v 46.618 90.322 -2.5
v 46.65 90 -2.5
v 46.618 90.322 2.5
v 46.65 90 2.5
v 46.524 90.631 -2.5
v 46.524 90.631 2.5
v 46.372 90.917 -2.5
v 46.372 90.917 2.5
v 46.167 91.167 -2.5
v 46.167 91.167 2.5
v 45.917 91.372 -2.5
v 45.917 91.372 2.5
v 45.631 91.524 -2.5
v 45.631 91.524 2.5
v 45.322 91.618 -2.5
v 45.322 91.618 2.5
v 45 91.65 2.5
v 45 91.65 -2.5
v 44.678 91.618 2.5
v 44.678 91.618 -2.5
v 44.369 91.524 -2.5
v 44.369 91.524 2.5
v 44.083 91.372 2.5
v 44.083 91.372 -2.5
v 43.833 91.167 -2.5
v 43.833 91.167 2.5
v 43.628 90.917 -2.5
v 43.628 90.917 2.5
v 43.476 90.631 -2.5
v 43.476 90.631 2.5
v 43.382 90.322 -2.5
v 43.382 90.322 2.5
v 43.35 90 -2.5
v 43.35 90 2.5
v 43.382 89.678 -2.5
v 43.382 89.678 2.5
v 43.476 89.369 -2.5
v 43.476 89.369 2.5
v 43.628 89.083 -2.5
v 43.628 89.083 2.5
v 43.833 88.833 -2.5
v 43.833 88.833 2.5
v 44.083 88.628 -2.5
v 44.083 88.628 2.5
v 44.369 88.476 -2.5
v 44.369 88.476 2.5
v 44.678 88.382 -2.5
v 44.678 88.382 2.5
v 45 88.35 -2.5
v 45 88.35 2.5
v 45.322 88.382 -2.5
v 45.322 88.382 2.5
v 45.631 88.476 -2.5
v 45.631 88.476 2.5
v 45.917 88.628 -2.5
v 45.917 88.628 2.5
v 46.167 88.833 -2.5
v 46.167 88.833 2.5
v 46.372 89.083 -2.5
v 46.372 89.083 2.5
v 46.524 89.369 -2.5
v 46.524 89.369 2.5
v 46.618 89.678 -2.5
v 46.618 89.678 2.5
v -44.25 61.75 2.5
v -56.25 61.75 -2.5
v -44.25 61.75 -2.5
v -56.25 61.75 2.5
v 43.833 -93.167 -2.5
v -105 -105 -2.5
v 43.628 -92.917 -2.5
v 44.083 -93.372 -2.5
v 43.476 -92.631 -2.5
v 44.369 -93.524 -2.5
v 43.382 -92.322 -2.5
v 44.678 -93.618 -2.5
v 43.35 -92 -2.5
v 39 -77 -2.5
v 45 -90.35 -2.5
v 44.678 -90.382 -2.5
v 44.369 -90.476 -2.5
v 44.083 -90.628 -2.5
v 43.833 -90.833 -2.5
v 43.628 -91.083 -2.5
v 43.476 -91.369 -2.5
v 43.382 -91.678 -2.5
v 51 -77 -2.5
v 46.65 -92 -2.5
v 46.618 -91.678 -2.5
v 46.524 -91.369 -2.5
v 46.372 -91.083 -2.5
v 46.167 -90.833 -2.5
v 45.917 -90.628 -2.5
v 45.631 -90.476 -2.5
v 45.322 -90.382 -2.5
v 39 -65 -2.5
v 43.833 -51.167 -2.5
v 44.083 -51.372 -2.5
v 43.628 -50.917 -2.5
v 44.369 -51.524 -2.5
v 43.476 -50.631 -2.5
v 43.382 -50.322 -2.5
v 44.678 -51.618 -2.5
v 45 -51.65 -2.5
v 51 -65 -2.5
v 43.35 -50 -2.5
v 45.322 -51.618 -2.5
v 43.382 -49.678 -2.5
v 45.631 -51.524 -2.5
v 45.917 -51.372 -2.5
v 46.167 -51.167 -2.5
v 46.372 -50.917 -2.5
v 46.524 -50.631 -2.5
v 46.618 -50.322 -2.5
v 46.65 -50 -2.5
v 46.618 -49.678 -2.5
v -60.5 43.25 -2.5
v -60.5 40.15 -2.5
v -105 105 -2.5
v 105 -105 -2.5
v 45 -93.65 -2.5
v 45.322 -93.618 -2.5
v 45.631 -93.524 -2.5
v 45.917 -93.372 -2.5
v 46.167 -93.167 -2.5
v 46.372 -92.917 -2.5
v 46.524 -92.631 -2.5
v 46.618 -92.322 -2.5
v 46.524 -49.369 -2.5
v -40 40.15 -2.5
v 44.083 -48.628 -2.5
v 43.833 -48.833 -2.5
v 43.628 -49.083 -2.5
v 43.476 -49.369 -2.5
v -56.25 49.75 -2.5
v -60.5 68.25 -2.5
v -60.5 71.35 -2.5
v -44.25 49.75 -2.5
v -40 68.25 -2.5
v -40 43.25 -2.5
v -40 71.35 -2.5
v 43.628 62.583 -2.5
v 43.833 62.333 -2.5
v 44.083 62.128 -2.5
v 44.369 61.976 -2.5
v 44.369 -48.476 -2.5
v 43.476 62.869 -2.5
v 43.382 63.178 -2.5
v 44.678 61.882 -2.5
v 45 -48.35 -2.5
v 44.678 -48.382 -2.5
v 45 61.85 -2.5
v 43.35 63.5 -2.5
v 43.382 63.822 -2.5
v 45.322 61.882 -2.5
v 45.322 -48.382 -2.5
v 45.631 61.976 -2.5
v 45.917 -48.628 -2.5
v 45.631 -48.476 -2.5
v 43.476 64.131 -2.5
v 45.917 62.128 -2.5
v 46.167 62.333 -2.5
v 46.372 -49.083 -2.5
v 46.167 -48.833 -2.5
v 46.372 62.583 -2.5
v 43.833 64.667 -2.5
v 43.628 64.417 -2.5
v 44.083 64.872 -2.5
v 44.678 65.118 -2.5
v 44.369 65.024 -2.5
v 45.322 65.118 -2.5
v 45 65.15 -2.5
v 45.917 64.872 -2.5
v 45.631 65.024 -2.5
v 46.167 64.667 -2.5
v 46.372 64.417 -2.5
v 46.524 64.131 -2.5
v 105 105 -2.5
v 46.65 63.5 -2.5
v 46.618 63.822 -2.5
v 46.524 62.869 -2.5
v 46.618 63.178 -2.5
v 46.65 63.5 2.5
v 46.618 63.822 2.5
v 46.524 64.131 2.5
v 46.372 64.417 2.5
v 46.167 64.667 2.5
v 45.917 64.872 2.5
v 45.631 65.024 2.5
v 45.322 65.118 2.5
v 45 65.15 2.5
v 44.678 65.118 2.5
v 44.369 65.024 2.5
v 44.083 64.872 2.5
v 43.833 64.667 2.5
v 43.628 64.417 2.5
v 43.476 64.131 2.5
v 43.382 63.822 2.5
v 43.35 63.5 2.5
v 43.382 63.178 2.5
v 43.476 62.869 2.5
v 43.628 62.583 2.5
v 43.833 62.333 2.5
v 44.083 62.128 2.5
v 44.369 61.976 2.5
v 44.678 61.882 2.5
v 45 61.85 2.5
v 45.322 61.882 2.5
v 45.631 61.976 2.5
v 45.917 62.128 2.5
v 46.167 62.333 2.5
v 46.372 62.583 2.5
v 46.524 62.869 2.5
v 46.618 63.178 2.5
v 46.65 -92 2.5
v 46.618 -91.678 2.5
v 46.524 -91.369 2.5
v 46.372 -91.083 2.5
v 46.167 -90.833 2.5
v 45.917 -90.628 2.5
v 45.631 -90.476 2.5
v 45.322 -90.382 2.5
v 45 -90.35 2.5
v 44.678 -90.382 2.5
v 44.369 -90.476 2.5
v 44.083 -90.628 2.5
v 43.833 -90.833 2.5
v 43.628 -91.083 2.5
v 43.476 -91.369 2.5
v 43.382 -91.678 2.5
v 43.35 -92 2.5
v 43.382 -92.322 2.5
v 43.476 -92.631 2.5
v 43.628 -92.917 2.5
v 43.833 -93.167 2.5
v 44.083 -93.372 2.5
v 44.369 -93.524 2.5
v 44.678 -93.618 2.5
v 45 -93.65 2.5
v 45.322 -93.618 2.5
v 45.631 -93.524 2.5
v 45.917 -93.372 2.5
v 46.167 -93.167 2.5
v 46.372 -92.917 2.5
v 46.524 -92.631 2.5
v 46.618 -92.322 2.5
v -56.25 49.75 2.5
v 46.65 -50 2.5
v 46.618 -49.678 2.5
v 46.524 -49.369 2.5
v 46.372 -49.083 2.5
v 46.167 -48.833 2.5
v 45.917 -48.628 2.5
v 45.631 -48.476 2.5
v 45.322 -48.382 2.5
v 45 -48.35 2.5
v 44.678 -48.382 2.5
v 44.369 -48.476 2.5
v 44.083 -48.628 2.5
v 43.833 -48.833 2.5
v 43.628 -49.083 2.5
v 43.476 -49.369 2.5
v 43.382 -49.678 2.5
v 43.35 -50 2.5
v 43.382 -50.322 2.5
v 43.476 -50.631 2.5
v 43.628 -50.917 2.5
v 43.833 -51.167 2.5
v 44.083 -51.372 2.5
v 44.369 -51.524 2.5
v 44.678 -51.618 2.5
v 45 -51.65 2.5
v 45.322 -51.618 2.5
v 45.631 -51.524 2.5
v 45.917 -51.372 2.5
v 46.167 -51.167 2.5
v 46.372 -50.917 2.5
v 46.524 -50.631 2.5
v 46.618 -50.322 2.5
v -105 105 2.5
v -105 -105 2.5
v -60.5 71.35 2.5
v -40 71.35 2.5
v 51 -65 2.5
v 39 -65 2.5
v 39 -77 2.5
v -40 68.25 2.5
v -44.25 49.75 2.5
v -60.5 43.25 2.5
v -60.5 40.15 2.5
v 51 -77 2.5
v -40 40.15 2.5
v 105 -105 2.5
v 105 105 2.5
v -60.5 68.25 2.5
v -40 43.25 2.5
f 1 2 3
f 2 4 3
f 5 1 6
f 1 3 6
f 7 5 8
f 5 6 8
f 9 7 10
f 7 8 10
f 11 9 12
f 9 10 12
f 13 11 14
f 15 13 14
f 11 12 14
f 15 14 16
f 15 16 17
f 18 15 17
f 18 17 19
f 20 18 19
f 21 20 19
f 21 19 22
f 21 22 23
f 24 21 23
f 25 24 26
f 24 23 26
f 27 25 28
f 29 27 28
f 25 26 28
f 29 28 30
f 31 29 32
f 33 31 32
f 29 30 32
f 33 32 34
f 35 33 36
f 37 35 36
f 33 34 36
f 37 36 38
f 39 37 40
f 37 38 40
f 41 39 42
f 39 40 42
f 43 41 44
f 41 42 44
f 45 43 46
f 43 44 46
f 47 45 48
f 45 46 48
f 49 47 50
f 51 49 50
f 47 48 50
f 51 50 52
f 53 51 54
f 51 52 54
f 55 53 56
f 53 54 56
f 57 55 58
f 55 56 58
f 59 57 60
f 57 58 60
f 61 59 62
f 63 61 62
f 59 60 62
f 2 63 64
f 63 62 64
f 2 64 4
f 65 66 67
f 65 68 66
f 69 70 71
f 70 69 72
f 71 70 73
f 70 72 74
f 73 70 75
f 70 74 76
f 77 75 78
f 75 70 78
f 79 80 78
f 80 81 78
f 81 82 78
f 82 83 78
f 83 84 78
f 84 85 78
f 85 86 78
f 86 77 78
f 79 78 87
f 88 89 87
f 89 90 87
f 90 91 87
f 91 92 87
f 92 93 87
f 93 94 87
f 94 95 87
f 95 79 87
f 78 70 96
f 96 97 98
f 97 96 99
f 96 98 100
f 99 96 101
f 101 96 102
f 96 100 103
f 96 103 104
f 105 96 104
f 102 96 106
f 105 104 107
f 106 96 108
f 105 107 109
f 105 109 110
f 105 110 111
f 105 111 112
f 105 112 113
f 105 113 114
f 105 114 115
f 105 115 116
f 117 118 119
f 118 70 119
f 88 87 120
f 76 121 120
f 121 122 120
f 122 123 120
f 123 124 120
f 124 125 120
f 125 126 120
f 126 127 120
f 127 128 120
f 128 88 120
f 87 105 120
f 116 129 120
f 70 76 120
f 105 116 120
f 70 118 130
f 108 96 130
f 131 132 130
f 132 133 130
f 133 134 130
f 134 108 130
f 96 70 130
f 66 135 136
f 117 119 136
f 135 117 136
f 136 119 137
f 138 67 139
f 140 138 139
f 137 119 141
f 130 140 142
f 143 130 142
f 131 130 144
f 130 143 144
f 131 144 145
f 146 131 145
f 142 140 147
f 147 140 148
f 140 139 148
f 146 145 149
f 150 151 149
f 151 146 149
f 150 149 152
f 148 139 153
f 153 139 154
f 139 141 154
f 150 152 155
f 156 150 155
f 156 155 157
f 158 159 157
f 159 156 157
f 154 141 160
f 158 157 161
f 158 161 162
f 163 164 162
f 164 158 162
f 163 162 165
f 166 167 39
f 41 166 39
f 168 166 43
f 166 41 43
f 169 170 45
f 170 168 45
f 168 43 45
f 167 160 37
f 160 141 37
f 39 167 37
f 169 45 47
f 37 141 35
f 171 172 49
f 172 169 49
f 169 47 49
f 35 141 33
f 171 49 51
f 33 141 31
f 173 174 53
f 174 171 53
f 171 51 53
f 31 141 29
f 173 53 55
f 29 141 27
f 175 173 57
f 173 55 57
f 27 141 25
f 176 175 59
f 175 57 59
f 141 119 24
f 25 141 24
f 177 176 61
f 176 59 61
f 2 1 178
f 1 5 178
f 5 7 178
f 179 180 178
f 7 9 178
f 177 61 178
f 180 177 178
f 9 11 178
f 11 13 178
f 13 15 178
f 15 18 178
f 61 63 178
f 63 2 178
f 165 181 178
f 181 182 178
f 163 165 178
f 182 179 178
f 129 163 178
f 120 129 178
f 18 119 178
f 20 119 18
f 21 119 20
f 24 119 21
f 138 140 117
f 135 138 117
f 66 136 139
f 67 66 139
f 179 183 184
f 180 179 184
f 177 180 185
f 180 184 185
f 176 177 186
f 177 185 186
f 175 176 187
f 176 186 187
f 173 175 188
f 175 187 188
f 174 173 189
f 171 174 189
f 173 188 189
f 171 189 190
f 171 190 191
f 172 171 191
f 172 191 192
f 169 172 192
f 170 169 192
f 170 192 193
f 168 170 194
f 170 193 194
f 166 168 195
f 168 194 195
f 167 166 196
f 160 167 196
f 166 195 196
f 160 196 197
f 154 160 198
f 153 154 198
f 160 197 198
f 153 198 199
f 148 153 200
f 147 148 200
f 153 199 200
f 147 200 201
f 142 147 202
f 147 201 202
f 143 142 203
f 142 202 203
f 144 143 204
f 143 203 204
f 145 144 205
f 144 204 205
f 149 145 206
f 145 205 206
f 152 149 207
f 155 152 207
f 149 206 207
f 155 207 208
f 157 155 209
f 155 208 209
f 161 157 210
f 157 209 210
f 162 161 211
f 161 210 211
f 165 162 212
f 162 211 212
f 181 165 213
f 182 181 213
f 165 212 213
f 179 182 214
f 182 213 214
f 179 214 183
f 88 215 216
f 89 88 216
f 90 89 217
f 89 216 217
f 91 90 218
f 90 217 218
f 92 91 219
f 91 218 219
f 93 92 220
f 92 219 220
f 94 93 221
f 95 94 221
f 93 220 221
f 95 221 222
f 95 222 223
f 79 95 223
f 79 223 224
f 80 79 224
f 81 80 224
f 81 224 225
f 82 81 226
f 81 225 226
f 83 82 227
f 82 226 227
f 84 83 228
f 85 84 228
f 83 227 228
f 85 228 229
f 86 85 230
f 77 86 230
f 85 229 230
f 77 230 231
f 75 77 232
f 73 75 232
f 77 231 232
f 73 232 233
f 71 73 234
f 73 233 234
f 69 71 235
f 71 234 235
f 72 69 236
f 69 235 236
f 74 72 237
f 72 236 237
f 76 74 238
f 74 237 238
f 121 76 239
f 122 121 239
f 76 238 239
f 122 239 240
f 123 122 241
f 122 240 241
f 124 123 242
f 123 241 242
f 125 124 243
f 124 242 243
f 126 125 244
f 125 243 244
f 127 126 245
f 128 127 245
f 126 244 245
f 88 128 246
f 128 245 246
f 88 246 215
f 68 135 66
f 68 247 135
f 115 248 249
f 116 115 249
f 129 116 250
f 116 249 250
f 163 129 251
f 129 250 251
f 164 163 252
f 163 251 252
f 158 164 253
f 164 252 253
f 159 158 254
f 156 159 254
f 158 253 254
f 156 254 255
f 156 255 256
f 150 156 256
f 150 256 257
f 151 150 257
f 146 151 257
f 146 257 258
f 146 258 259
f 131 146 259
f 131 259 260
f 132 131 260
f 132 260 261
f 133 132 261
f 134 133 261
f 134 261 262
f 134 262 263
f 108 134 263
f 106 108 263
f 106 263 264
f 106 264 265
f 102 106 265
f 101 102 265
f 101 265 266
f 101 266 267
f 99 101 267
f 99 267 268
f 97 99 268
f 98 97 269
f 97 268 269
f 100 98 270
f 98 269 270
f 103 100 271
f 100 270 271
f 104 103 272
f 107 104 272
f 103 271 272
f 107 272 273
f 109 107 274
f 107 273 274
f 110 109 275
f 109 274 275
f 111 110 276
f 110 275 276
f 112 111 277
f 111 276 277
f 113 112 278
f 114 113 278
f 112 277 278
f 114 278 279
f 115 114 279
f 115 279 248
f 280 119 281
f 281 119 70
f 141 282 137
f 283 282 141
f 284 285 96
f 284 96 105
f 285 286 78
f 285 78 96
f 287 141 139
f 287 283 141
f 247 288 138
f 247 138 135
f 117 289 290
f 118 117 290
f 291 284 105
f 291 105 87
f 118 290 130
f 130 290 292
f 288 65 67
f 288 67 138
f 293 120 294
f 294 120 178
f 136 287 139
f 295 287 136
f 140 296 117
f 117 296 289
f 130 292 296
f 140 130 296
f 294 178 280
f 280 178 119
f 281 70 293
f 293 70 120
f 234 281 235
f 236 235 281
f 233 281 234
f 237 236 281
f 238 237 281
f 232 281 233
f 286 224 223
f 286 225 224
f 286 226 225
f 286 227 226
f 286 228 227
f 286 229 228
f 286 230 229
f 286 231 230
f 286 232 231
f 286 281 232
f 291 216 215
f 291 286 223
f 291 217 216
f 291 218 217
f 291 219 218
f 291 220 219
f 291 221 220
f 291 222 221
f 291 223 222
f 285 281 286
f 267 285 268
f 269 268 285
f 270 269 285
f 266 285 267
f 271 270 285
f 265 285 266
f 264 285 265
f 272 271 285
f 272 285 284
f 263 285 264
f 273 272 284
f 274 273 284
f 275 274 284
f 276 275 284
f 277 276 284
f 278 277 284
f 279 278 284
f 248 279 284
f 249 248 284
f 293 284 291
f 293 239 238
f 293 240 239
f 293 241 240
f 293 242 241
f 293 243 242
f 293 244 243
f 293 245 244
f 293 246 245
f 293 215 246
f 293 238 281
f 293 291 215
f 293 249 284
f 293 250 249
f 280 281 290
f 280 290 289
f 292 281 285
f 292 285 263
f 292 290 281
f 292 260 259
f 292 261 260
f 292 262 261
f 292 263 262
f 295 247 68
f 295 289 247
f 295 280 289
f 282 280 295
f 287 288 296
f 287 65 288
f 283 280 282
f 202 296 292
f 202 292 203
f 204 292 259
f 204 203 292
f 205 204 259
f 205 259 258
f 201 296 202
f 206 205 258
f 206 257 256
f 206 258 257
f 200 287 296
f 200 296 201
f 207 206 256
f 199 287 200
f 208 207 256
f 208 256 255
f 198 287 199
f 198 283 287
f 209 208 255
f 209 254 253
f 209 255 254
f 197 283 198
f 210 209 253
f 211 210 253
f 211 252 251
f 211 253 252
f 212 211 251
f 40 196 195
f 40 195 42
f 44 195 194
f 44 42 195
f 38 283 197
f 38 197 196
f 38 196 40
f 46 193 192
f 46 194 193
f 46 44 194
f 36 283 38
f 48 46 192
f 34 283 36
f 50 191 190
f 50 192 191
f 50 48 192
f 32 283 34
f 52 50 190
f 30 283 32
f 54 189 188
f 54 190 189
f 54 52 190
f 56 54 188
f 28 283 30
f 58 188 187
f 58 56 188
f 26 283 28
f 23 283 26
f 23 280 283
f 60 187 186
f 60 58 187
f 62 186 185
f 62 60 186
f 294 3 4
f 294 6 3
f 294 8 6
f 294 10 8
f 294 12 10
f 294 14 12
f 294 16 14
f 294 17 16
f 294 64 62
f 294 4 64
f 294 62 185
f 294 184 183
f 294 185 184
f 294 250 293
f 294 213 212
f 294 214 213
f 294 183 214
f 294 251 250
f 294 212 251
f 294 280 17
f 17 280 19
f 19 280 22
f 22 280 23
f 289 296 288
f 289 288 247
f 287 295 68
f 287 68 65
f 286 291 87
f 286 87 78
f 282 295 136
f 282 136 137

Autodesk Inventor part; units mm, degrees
ref_plane "YZ Plane" through (0, 0, 0) normal (1, 0, 0) x (0, 1, 0)
ref_plane "XZ Plane" through (0, 0, 0) normal (0, 1, 0) x (-1, 0, 0)
ref_plane "XY Plane" through (0, 0, 0) normal (0, 0, 1) x (1, 0, 0)
sketch "Sketch1" plane through (0, 0, 0) normal (0, 0, 1) x (1, 0, 0)
  line L0 (-105, -105) -> (105, -105)
  line L1 (105, -105) -> (105, 105)
  line L2 (105, 105) -> (-105, 105)
  line L3 (-105, 105) -> (-105, -105)
  line L4 (-105, -105) -> (105, 105) construction
  line L5 (105, -105) -> (-105, 105) construction
  point P0 (0, 0)
  dimension "d0" = 210
  dimension "d1" = 210
extrude "Plate1" add sketch "Sketch1" along normal mid plane 5
sketch "Sketch2" plane through (0, 0, 2.5) normal (0, 0, 1) x (1, 0, 0)
  circle A0 centre (45, 90) radius 1.65
  line L0 (105, 105) -> (105, -105) projected
  line L1 (105, -105) -> (-105, -105) projected
  line L2 (-105, 105) -> (105, 105) projected
  circle A1 centre (45, -92) radius 1.65
  circle A2 centre (45, -50) radius 1.65
  circle A3 centre (45, 63.5) radius 1.65
  point P0 (0, 0)
  dimension "d3" = 3.3
  dimension "d4" = 60
  dimension "d8" = 15
  dimension "d21" = 42
  dimension "d22" = 140
  dimension "d26" = 3.3
  dimension "d27" = 26.5
extrude "Cut1" cut sketch "Sketch2" against normal blind 5
sketch "Sketch3" plane through (0, 0, 2.5) normal (0, 0, 1) x (1, 0, 0)
  line L0 (-60.5, 71.35) -> (-40, 71.35)
  line L1 (-40, 71.35) -> (-40, 68.25)
  line L2 (-40, 68.25) -> (-60.5, 68.25)
  line L3 (-60.5, 68.25) -> (-60.5, 71.35)
  line L4 (0, 55.75) -> (-105, 55.75)
  line L5 (-105, 105) -> (-105, -105) projected
  line L6 (-50.25, 71.35) -> (-50.25, -105)
  circle A0 centre (45, 90) radius 1.65 projected
  line L7 (105, -105) -> (-105, -105) projected
  line L8 (-60.5, 40.15) -> (-40, 40.15)
  line L9 (-40, 40.15) -> (-40, 43.25)
  line L10 (-40, 43.25) -> (-60.5, 43.25)
  line L11 (-60.5, 43.25) -> (-60.5, 40.15)
  point P0 (0, 0)
  point P1 (-50.25, 40.15)
  dimension "d9" = 3.1
  dimension "d11" = 20.5
  dimension "d12" = 85
  dimension "d14" = 25
  dimension "d15" = 17
extrude "Cut2" cut sketch "Sketch3" against normal blind 5 contours L0 L6 L2 L3 | L0 L1 L2 L6 | L10 L9 L8 L6 | L6 L8 L11 L10
sketch "Sketch5" plane through (0, 0, 2.5) normal (0, 0, 1) x (1, 0, 0)
  circle A0 centre (45, -50) radius 1.65 projected
  circle A1 centre (45, -92) radius 1.65 projected
  line L0 (45, -50) -> (45, -92)
  line L1 (39, -65) -> (51, -65)
  line L2 (51, -65) -> (51, -77)
  line L3 (51, -77) -> (39, -77)
  line L4 (39, -77) -> (39, -65)
  line L5 (39, -65) -> (51, -77) construction
  line L6 (51, -65) -> (39, -77) construction
  point P0 (0, 0)
  point P1 (45, -71)
  dimension "d23" = 12
extrude "Cut3" cut sketch "Sketch5" against normal blind 5 contours L1 L2 L3 L0 | L0 L3 L4 L1
sketch "Sketch6" plane through (0, 0, 2.5) normal (0, 0, 1) x (1, 0, 0)
  line L0 (-56.25, 61.75) -> (-44.25, 61.75)
  line L1 (-44.25, 61.75) -> (-44.25, 49.75)
  line L2 (-44.25, 49.75) -> (-56.25, 49.75)
  line L3 (-56.25, 49.75) -> (-56.25, 61.75)
  line L4 (-56.25, 61.75) -> (-44.25, 49.75) construction
  line L5 (-44.25, 61.75) -> (-56.25, 49.75) construction
  line L6 (-60.5, 71.35) -> (-40, 71.35) projected
  line L7 (-40, 68.25) -> (-60.5, 68.25) projected
  point P0 (0, 0)
  point P1 (-50.25, 55.75)
  point P2 (-50.25, 71.35)
  point P3 (-50.25, 68.25)
  dimension "d28" = 12
  dimension "d29" = 12.5
extrude "Cut4" cut sketch "Sketch6" against normal blind 5
equation "\"d6\" = Thickness"
equation "\"d17\" = Thickness"
equation "\"d24\" = Thickness"
equation "\"d30\" = Thickness"
equation "\"d2\" = Thickness"
equation "\"BendRadius\" = Thickness"
equation "\"BendReliefWidth\" = Thickness"
equation "\"BendReliefDepth\" = 0.5 * Thickness"
equation "\"TransitionRadius\" = BendRadius"
equation "\"JacobiRadiusSize\" = BendRadius"
equation "\"GapSize\" = Thickness"
equation "\"Thickness\" = 5"
properties part number "Base"
